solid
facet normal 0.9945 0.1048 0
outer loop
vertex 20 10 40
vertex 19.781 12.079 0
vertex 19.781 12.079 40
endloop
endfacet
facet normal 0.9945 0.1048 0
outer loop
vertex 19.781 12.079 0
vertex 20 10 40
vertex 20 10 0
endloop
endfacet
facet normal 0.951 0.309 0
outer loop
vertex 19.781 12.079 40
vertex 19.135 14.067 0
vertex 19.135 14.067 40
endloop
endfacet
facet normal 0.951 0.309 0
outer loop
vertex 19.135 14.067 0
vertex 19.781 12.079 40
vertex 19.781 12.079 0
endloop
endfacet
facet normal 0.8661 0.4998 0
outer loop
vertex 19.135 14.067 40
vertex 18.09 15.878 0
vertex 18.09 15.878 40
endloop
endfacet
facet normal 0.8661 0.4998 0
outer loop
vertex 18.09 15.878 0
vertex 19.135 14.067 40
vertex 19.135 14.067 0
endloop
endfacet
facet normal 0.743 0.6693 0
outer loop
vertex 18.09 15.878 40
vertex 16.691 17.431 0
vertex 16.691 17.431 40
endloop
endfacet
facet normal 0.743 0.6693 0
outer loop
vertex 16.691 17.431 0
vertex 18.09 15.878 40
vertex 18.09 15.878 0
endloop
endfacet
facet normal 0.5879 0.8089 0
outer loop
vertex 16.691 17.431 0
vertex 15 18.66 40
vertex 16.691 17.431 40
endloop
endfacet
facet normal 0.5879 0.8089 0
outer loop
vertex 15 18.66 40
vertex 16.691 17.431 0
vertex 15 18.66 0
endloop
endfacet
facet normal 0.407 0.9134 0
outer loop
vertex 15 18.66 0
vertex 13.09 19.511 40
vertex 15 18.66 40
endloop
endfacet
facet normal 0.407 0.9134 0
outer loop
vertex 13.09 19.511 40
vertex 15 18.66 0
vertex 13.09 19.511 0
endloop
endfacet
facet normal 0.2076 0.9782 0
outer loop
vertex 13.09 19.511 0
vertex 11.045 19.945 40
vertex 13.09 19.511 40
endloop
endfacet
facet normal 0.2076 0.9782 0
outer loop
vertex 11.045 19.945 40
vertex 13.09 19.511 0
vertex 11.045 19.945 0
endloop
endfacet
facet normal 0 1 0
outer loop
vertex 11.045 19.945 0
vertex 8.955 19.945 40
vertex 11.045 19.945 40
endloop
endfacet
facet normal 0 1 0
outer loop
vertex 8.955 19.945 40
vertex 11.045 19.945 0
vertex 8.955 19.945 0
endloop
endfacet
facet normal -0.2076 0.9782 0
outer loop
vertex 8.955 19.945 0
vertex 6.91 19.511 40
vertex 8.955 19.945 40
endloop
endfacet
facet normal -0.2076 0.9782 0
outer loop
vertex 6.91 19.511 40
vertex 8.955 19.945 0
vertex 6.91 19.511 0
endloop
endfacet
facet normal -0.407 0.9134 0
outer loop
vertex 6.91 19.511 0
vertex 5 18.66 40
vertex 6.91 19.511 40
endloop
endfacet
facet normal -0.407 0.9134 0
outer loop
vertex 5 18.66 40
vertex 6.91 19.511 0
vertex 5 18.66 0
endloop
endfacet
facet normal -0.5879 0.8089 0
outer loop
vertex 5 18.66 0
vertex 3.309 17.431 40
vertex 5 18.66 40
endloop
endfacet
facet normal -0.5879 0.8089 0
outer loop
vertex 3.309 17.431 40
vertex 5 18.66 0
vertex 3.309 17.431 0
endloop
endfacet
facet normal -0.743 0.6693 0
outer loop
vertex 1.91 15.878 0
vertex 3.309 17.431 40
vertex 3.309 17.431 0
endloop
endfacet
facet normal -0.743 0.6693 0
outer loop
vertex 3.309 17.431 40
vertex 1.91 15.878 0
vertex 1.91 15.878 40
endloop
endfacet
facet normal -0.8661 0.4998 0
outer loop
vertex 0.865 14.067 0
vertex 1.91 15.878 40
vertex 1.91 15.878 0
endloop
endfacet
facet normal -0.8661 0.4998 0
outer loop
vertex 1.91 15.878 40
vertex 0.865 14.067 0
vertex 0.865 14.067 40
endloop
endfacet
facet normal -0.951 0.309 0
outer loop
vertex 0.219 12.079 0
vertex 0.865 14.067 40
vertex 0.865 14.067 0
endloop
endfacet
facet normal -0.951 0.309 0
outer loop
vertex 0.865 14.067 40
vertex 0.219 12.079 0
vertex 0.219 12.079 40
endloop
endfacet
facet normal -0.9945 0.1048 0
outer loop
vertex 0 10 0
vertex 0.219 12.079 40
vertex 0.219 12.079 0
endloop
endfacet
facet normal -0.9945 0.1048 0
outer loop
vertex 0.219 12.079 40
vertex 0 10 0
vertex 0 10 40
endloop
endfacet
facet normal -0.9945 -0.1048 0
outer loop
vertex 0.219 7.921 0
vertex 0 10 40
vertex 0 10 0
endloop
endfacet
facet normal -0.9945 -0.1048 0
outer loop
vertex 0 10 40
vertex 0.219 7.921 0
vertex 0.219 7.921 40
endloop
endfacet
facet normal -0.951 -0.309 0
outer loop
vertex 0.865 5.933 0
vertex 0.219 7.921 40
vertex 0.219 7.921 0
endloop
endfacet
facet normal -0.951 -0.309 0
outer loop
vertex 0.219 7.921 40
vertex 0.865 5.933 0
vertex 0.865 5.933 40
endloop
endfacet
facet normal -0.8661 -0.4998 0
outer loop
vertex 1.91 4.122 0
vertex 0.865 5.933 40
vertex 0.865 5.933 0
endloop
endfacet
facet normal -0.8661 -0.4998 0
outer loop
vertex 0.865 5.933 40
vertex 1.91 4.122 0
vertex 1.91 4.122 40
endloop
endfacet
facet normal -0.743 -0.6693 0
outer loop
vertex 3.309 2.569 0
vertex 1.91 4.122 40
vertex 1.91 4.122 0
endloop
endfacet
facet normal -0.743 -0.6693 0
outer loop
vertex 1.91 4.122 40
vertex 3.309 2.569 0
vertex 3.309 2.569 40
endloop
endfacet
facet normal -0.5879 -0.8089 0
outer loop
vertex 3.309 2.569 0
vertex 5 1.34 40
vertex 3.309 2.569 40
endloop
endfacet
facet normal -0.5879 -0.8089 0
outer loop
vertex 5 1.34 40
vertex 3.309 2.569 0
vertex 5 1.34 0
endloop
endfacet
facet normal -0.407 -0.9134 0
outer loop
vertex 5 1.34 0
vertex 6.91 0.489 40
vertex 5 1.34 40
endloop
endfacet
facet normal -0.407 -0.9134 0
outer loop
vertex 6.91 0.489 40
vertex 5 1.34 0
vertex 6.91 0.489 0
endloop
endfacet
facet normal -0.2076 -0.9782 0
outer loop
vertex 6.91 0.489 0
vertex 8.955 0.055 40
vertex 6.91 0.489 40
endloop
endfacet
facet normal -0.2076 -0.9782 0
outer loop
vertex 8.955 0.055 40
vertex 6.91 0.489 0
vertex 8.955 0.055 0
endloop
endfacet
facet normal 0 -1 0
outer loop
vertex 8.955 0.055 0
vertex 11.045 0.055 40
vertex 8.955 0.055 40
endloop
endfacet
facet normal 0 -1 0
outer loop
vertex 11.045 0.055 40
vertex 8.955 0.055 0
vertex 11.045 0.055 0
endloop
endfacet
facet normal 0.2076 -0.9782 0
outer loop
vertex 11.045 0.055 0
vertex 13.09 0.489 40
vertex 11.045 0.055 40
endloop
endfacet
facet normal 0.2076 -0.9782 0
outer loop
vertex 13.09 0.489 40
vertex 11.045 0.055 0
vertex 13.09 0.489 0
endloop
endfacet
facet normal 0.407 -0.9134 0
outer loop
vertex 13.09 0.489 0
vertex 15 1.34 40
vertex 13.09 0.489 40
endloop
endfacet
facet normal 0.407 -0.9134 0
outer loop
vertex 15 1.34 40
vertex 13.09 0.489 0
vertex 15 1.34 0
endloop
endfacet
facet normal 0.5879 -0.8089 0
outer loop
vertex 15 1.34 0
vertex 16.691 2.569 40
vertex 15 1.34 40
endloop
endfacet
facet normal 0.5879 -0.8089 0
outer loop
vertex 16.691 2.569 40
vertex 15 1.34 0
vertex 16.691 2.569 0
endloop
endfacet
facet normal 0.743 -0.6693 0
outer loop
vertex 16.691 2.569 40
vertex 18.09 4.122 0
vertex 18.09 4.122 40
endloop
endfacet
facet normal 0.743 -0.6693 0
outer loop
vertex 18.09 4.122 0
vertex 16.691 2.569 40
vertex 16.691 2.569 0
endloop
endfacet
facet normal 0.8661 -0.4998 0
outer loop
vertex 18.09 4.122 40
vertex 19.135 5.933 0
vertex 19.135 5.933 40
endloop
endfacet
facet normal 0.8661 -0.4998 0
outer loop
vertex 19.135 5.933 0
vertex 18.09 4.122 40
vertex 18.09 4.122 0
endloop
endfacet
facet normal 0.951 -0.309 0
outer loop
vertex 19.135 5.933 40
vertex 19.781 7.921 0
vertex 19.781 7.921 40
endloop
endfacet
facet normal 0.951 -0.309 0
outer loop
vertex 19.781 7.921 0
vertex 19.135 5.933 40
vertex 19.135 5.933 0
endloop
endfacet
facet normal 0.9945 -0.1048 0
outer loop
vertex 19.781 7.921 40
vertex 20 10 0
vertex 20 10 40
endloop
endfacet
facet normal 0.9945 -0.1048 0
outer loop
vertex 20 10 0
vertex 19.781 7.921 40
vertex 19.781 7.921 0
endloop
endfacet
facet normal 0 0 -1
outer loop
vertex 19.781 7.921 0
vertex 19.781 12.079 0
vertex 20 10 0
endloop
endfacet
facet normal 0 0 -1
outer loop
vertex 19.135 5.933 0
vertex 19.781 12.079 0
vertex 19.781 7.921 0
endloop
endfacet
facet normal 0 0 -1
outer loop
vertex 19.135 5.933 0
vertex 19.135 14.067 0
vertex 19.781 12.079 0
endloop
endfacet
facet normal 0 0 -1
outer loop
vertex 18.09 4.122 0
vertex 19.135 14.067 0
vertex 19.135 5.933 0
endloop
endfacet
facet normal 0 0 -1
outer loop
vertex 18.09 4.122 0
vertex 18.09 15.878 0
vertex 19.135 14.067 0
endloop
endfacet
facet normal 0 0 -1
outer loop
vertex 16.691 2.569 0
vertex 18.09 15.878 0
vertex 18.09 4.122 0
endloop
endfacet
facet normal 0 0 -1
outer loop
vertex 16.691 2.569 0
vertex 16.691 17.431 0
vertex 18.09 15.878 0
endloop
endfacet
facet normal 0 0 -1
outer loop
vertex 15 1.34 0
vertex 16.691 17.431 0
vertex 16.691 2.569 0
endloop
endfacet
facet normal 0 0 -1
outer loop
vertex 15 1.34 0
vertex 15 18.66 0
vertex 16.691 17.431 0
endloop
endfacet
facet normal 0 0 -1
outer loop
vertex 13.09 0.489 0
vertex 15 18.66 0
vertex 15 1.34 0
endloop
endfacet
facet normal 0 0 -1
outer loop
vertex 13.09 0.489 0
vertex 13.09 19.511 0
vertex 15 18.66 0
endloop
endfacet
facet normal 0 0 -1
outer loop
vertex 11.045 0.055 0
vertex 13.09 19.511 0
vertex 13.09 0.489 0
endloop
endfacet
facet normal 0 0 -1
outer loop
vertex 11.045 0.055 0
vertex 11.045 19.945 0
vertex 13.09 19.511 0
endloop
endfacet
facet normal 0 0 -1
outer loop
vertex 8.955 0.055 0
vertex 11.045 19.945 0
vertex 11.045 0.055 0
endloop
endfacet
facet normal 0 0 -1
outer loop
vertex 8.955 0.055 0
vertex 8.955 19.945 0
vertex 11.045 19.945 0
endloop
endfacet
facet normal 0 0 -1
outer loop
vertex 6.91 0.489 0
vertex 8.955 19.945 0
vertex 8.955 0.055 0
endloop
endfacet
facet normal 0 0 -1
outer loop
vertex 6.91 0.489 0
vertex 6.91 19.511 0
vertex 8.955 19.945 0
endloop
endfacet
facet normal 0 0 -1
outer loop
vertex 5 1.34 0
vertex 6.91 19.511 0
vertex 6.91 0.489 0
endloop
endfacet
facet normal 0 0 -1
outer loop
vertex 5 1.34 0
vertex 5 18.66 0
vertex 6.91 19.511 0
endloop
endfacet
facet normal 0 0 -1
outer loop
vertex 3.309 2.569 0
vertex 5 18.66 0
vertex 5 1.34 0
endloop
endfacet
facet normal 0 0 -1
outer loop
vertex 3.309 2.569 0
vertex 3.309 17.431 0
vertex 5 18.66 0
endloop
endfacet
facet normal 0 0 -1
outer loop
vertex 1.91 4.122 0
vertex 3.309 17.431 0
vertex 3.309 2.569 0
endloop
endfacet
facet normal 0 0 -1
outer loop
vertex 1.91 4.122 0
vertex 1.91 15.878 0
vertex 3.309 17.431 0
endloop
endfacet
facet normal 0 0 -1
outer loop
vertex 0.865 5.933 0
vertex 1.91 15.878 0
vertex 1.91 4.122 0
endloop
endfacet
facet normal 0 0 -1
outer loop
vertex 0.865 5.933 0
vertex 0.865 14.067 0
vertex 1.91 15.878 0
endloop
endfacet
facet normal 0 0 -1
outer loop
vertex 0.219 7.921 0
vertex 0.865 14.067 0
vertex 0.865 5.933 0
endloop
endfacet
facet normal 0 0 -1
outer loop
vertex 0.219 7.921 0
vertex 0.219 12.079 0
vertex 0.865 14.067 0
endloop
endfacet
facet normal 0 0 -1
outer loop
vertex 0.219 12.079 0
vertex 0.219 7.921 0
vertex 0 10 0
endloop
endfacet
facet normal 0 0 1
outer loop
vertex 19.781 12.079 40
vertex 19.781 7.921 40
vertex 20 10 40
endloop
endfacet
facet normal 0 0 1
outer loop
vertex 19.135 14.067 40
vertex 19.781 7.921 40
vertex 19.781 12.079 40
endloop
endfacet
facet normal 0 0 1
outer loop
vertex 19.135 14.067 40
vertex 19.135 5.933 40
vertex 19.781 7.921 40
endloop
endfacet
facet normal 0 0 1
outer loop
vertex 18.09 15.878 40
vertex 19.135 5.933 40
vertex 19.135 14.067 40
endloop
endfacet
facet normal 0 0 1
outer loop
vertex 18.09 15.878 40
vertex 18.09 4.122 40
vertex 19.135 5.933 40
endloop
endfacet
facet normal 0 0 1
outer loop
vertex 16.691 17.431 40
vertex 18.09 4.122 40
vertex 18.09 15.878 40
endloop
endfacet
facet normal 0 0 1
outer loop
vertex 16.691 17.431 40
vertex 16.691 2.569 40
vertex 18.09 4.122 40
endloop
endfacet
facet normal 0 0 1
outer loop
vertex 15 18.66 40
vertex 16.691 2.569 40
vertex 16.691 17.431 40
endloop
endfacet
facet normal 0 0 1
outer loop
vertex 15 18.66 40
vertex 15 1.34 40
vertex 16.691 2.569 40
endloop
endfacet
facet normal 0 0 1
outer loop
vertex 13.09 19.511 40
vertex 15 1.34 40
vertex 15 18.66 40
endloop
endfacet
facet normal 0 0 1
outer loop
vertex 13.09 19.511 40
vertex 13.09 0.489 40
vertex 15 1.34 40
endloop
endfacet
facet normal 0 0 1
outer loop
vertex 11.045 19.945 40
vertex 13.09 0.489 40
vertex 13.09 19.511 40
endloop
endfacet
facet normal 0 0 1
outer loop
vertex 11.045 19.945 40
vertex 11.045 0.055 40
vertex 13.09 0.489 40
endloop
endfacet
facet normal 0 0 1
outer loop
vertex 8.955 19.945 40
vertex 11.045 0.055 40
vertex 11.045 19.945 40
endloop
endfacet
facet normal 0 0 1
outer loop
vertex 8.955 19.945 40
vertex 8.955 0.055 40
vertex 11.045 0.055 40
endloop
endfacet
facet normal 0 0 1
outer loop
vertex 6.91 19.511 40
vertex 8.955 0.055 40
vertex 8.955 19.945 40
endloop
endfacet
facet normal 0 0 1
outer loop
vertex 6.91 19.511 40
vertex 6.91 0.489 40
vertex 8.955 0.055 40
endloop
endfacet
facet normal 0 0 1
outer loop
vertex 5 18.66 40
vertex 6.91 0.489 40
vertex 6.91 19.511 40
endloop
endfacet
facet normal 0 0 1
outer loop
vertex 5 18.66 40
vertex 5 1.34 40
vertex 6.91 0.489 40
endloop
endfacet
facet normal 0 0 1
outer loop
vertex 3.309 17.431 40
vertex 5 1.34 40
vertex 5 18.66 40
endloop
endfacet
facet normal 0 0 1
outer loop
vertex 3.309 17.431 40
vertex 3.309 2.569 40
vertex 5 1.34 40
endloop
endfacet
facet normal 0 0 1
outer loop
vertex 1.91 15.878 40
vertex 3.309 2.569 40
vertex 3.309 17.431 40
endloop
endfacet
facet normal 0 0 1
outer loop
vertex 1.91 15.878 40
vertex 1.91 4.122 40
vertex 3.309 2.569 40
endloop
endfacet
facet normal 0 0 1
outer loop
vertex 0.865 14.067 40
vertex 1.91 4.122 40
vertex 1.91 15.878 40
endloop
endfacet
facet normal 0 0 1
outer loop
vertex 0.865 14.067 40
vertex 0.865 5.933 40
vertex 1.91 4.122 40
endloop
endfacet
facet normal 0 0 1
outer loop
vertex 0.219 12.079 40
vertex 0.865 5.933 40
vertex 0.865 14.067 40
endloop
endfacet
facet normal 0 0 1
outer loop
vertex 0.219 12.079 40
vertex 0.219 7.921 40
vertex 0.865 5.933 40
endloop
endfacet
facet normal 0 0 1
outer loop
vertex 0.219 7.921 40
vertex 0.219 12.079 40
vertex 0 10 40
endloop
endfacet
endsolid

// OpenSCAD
// file: rounding_cylinder_centered/rounding_cylinder_centered.scad
module rounding_cylinder_centered() {
    cylinder(h=40, r=10);
}

// call module when run directly
rounding_cylinder_centered();
// main file
// use modules
use <rounding_cylinder_centered/rounding_cylinder_centered.scad>

module rounding_cylinder() {
    translate(v=[10, 10, 0]) {
        rounding_cylinder_centered();
    }
}

// call module when run directly
rounding_cylinder();
